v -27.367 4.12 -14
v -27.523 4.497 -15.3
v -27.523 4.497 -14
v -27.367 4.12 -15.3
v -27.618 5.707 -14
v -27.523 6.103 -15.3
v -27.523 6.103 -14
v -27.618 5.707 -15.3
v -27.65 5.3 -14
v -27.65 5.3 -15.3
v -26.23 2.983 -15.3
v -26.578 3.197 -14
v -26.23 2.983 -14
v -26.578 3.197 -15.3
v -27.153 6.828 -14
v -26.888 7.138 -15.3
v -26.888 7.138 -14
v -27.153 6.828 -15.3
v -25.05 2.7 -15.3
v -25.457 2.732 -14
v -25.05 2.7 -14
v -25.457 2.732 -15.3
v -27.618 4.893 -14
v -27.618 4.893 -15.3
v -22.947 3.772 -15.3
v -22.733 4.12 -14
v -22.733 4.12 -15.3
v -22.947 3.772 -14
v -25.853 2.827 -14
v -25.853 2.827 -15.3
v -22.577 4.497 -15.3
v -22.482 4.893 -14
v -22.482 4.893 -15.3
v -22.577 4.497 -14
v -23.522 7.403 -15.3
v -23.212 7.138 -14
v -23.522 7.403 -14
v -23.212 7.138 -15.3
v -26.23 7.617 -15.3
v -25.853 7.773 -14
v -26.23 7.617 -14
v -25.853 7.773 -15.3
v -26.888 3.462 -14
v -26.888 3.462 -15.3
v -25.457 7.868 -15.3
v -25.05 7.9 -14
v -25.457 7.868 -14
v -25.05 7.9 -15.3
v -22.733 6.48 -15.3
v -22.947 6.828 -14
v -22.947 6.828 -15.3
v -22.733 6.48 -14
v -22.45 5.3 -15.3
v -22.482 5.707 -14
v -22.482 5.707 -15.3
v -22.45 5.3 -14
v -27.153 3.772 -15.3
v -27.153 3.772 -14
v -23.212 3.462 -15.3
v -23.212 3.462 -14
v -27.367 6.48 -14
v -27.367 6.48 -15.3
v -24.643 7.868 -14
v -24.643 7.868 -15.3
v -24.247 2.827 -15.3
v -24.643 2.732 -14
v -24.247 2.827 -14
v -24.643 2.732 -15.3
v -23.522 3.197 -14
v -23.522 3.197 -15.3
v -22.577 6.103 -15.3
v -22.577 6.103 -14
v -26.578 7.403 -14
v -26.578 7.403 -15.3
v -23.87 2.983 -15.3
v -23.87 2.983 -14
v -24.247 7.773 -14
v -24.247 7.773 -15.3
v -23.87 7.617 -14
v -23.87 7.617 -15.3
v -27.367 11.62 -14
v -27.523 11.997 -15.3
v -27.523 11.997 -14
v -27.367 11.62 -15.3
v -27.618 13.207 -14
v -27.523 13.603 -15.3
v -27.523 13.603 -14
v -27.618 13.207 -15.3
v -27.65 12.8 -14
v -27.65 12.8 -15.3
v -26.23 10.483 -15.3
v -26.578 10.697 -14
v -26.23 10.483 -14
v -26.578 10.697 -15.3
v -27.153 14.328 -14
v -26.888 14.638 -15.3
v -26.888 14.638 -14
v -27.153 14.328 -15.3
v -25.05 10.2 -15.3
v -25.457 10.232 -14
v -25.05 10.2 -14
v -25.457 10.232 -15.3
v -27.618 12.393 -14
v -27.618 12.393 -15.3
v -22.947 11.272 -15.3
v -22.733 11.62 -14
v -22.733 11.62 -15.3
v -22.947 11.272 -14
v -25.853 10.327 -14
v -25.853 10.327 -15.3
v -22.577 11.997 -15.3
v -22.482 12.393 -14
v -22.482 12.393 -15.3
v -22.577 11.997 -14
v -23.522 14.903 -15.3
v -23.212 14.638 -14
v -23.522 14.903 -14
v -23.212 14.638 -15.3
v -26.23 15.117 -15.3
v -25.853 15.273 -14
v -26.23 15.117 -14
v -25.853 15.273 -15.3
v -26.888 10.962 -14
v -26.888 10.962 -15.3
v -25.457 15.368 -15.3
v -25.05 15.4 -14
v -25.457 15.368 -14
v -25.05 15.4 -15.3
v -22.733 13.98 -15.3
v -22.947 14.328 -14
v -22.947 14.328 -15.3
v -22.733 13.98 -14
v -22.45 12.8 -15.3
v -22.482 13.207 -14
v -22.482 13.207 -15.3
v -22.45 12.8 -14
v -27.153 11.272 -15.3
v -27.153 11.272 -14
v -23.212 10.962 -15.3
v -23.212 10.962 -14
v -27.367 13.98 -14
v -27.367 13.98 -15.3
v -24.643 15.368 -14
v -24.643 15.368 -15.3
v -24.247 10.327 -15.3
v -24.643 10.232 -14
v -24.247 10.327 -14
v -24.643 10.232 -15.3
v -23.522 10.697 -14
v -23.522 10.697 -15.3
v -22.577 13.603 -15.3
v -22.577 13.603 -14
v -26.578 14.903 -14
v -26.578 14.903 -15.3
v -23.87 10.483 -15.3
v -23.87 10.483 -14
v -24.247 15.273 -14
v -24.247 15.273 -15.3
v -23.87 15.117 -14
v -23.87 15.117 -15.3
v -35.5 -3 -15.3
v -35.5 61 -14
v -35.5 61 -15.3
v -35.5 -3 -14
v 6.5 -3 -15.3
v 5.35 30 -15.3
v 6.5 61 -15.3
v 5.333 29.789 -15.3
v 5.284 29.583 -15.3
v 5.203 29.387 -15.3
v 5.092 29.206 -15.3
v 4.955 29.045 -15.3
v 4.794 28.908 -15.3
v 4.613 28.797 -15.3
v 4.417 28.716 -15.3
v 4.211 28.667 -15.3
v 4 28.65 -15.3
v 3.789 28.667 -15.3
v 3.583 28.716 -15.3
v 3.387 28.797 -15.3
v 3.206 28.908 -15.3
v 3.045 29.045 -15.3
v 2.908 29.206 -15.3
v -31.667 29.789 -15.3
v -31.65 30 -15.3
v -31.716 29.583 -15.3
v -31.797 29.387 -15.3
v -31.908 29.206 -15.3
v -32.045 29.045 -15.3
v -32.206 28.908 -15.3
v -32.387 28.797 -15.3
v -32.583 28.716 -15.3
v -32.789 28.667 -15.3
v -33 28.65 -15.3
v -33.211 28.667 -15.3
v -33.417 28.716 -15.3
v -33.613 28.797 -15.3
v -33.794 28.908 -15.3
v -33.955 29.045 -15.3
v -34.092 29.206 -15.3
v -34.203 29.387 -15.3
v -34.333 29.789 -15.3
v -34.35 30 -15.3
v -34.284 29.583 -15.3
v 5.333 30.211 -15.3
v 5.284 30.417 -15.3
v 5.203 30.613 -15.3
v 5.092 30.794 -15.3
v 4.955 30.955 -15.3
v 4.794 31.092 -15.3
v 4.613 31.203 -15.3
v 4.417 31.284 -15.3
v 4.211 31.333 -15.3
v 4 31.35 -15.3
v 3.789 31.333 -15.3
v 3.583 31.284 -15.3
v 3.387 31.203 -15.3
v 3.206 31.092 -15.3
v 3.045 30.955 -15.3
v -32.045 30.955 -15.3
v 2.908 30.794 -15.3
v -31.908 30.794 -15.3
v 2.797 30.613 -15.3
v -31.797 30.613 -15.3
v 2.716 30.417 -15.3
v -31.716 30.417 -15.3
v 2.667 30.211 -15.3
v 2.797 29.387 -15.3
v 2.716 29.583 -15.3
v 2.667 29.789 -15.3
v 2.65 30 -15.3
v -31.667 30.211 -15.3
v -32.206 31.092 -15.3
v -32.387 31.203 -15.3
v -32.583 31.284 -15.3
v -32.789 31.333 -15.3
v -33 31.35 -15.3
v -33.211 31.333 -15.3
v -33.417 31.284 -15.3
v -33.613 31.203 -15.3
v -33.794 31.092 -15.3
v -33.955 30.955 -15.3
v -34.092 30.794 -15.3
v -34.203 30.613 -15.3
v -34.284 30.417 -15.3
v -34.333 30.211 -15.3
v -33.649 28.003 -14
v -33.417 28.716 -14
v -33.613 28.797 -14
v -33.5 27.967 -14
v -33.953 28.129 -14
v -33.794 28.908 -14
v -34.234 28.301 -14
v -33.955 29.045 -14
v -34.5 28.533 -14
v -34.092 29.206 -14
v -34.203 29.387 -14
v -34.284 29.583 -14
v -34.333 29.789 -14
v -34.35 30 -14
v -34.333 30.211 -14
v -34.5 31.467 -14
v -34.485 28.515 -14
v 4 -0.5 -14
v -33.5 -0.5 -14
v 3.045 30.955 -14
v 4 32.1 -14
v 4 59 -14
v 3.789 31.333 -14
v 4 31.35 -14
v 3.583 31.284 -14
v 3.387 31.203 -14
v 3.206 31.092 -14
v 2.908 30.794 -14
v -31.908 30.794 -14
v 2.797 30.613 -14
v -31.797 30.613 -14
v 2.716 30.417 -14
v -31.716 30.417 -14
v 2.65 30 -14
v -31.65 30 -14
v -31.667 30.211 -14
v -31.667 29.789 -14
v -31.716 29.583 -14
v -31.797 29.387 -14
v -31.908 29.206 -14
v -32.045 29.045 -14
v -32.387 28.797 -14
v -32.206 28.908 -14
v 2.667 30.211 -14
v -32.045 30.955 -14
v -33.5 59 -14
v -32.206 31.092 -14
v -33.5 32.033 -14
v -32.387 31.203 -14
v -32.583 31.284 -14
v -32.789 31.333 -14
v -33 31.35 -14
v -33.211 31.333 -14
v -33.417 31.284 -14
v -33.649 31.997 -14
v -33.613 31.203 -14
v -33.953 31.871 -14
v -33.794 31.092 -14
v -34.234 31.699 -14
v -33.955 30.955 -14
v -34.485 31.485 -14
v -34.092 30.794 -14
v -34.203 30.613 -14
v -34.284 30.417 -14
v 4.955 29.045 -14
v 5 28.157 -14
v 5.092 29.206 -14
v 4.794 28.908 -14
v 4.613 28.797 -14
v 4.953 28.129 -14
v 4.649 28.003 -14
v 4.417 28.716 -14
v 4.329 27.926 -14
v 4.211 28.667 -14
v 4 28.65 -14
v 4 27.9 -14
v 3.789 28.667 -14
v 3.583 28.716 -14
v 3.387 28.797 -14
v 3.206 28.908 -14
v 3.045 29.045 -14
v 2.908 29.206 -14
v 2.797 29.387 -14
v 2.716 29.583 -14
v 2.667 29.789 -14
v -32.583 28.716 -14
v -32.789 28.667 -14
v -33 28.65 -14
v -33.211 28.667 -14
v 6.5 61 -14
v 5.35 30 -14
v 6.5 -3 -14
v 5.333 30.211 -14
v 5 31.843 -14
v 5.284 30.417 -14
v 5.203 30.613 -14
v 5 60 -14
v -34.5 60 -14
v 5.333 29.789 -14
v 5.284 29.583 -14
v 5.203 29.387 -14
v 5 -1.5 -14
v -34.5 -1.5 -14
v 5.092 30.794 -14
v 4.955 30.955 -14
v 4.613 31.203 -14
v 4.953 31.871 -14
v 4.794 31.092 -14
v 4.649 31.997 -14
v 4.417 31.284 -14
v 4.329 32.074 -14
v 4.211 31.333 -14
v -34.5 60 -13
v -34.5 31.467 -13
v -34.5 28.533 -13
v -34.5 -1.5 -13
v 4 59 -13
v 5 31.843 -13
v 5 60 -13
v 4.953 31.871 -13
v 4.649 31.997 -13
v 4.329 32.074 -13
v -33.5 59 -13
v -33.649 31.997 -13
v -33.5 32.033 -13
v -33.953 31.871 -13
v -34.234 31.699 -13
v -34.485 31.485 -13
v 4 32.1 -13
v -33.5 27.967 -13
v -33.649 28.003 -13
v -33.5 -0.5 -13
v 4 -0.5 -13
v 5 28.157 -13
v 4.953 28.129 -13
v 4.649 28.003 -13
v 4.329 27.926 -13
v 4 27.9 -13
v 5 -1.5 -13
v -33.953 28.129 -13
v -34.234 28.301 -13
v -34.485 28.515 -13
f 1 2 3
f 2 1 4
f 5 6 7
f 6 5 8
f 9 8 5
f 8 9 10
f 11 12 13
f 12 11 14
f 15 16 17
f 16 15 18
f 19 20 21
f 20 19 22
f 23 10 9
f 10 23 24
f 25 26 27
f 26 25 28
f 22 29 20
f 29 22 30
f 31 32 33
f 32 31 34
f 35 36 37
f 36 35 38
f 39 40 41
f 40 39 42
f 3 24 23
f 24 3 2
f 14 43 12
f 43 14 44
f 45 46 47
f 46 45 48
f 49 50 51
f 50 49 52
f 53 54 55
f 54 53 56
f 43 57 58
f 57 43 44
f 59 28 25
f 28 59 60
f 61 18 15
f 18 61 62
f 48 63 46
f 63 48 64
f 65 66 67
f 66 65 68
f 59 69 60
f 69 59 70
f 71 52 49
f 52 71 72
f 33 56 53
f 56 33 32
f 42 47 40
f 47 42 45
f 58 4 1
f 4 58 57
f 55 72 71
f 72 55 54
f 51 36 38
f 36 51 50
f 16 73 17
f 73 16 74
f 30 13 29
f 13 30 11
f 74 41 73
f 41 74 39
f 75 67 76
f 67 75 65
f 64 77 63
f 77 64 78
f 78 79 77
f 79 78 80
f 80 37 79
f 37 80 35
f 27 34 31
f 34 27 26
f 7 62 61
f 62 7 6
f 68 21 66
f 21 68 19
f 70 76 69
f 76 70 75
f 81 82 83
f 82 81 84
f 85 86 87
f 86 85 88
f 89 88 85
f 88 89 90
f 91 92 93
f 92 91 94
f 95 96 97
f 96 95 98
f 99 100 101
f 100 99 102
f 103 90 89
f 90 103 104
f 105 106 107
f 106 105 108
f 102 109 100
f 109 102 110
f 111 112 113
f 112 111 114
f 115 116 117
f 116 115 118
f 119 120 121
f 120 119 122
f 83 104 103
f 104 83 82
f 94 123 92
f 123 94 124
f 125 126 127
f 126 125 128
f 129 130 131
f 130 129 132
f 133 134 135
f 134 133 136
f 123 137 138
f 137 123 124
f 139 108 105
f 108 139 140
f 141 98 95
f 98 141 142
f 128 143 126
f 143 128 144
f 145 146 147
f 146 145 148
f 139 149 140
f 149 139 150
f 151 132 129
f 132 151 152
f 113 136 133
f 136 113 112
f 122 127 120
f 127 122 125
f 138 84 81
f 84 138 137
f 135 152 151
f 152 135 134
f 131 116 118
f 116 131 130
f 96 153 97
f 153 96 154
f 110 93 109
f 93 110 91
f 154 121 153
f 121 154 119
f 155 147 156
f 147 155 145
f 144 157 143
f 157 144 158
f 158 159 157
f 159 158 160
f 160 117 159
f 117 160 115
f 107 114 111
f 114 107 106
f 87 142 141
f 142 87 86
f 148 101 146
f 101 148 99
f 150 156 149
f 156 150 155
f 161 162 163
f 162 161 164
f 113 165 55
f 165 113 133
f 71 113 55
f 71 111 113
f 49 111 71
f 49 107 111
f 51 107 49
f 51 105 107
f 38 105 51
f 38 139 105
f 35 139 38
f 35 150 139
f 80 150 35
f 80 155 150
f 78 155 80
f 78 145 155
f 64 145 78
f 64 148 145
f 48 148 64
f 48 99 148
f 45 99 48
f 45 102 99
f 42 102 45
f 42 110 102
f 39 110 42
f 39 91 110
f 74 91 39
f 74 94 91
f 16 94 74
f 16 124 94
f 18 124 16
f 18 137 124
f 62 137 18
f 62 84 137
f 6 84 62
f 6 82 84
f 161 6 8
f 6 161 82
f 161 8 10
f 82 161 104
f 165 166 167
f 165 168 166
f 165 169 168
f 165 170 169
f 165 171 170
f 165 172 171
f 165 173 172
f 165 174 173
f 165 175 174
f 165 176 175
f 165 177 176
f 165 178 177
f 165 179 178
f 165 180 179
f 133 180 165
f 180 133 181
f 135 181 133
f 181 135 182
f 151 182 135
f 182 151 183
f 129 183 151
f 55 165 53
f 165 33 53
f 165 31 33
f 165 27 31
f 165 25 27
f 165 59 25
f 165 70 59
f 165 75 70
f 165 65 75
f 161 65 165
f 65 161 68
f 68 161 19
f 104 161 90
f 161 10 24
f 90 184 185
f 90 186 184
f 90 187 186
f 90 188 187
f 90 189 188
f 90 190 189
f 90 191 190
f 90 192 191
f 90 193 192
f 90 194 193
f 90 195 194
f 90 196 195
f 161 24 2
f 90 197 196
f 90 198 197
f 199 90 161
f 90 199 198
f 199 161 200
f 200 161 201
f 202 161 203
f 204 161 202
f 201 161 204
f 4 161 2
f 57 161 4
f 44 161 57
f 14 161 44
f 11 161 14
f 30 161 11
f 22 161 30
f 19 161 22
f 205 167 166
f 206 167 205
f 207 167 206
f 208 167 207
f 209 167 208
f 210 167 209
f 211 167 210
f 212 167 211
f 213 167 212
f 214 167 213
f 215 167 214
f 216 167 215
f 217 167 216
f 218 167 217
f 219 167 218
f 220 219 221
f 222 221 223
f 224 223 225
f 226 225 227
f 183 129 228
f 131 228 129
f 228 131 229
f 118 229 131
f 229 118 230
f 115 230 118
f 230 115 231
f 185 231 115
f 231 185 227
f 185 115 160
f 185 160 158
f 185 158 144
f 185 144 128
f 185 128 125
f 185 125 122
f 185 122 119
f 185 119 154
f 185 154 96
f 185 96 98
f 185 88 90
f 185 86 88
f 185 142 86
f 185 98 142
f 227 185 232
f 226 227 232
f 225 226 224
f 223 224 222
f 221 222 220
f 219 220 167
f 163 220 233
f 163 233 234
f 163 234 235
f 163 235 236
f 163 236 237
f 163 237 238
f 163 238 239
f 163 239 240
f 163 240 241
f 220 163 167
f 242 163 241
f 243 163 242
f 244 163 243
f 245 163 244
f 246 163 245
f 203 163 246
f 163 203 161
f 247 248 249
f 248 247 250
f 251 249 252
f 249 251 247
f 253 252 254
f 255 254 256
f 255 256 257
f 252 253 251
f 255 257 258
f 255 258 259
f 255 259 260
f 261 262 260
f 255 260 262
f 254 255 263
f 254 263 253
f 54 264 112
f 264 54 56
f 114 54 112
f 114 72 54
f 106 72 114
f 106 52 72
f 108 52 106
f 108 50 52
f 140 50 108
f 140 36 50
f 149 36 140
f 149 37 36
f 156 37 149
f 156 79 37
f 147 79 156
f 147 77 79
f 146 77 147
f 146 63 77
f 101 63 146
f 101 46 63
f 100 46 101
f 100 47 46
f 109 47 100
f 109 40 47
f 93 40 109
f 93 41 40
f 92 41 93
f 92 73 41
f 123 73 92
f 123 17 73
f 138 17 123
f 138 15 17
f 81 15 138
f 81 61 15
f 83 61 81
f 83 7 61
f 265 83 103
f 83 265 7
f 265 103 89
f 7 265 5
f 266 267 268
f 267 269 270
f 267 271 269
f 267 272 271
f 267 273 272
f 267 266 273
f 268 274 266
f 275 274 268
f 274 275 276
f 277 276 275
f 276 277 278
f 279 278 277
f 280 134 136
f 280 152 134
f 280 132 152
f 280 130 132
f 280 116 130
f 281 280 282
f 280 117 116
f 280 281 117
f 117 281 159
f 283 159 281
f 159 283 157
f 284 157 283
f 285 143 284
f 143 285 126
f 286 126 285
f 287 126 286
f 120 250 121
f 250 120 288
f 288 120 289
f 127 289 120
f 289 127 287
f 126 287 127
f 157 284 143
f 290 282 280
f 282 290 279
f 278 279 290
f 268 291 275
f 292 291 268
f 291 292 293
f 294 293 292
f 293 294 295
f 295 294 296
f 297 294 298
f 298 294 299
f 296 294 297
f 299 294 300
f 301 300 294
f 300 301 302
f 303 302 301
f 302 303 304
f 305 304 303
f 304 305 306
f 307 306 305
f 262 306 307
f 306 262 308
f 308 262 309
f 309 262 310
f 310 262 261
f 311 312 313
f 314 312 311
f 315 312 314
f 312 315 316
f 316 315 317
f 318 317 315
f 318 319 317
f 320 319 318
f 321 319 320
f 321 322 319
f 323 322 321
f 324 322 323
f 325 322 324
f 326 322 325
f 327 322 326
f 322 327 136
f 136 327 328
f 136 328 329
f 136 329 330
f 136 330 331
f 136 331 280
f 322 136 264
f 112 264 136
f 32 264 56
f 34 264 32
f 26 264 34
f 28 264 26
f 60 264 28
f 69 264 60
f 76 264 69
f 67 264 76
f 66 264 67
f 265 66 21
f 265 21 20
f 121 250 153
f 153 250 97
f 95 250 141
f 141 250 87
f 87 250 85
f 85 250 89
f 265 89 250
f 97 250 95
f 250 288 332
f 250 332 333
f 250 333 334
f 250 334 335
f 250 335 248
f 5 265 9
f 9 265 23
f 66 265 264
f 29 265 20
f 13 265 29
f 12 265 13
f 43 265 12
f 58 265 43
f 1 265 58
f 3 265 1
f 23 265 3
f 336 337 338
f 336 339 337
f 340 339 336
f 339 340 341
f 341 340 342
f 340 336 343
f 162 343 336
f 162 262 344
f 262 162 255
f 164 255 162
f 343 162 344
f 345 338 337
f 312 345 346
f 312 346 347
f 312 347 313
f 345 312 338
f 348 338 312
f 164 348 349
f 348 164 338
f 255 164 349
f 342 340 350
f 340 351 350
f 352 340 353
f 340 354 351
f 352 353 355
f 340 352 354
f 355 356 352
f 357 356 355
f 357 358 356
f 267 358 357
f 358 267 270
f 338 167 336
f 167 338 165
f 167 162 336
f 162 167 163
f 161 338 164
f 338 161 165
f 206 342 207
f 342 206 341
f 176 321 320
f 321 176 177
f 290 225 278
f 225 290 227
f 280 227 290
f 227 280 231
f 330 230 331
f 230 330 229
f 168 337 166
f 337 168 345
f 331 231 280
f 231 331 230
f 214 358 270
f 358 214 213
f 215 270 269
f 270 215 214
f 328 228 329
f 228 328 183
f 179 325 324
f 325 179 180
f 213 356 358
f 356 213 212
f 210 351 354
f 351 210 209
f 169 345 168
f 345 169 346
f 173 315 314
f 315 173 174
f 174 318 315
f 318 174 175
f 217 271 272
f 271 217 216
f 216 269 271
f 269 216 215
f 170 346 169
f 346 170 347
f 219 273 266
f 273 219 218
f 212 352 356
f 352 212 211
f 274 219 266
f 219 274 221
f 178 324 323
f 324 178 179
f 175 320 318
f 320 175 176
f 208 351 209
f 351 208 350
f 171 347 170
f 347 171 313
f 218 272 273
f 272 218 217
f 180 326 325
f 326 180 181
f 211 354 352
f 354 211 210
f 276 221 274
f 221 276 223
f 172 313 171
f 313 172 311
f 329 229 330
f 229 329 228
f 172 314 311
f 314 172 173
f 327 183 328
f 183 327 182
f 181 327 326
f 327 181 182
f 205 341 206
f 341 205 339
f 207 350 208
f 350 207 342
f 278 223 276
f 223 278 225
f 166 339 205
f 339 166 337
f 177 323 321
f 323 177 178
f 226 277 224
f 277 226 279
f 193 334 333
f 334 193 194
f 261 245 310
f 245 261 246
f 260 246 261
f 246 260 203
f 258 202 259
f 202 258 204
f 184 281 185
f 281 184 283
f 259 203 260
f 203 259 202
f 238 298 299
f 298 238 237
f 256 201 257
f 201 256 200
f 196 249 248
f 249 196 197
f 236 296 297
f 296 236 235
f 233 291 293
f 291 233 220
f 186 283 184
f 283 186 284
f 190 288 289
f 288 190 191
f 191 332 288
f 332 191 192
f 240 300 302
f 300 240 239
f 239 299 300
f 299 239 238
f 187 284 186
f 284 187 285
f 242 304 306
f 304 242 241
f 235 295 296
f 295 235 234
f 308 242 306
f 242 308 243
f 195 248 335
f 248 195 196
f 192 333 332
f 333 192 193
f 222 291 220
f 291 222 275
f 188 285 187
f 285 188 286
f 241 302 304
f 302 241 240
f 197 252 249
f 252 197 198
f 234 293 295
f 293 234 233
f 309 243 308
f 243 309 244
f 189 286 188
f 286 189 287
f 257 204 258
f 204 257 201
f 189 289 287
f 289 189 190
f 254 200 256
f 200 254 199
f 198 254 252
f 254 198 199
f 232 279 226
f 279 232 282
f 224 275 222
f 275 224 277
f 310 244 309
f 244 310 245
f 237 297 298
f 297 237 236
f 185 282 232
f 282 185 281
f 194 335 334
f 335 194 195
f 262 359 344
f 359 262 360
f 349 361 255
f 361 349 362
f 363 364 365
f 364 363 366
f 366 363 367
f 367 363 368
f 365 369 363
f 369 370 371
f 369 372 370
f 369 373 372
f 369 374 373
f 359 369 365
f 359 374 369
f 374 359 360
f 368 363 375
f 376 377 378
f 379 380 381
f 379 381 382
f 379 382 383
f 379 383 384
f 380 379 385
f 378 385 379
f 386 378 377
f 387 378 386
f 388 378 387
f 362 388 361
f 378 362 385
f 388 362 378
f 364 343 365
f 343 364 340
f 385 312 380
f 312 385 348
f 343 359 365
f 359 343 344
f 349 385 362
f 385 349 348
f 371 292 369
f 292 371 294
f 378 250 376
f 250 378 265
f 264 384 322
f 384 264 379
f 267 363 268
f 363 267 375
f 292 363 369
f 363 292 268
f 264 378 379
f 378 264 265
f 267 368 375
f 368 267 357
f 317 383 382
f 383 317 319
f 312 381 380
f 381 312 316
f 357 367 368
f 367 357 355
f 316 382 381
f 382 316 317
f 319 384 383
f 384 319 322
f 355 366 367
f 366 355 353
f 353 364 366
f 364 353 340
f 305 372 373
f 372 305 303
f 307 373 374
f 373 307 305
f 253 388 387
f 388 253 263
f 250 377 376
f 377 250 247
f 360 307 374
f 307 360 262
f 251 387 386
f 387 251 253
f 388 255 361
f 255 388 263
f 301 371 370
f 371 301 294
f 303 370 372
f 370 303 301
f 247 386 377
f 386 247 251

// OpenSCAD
$fn=40;
board_width = 32.72;
board_length = 54.61;
board_height = 2;

module bottom() {
    union() {
        difference() {
            translate([-6.5,-3,0]) cube([42,64,10]);
            translate([-5.5,-2,1]) cube([40,62,9.1]);
            // four mounting screws
            translate([-3.5,1,-0.1]) cylinder(d=3, h=1.2);
            translate([-3.5,49,-0.1]) cylinder(d=3, h=1.2);
            translate([33,1,-0.1]) cylinder(d=3, h=1.2);
            translate([33,49,-0.1]) cylinder(d=3, h=1.2);
            // cutout for power
            translate([-6.6,0,5]) minkowski() {
                cube([2,11,6]);
                rotate([0,90,0]) cylinder(d=2,h=2);
            }
        }
        // mount board to case
        translate([17.55,2.6,1]) difference() {
            cylinder(d=5,h=4);
            cylinder(d=2.8,h=4.1);
        }
        // mount board to case
        translate([28.85,39.4,1]) difference() {
            cylinder(d=5,h=4);
            cylinder(d=2.8,h=4.1);
        }
        //translate([-1.75,0,5]) cube([board_width, board_length, board_height]);
        
        // screwhole for top
        translate([-4,30,0.9]) difference() {
            cylinder(h=9.1,d=4);
            translate([0,0,4]) cylinder(h=5.2,d=2.5);
        }
        translate([33,30,0.9]) difference() {
            cylinder(h=9.1,d=4);
            translate([0,0,4]) cylinder(h=5.2,d=2.5);
        }
    }
}

module top() {
    union() {
        difference() {
            translate([-6.5,-3,14]) cube([42,64,1.3]);
            translate([25.05,5.3,12]) led();
            translate([25.05,12.8,12]) led();
            // Design for the top - deliberately not included
            rotate([0,0,90]) translate ([15.6,53,14.6]) linear_extrude(0.8) resize([35,0,0],auto=true) import("zenith_1937.dxf");
            translate([-4,30,13.9]) cylinder(h=1.5,d=2.7);
            translate([33,30,13.9]) cylinder(h=1.5,d=2.7);
        }
        difference() {
            translate([-5,-1.5,13]) cube([39.5,61.5,1]);
            translate([-4,-0.5,12.9]) cube([37.5,59.5,1.2]);
            translate([-4,30,12.9]) cylinder(h=1.3,d=4.2);
            translate([33,30,12.9]) cylinder(h=1.3,d=4.2);
        }
    }
}

module led() {
    union() {
        cylinder(h=6.1, r=2.6);
        translate([0,0,6.1]) sphere(r=2.6);
        difference() {
            cylinder(r=3.1,h=1);
            translate([2.6, -3, -.1]) cube([2,6,1.2]);
        }
    }
}

//bottom();

rotate([0,180,0]) top();
